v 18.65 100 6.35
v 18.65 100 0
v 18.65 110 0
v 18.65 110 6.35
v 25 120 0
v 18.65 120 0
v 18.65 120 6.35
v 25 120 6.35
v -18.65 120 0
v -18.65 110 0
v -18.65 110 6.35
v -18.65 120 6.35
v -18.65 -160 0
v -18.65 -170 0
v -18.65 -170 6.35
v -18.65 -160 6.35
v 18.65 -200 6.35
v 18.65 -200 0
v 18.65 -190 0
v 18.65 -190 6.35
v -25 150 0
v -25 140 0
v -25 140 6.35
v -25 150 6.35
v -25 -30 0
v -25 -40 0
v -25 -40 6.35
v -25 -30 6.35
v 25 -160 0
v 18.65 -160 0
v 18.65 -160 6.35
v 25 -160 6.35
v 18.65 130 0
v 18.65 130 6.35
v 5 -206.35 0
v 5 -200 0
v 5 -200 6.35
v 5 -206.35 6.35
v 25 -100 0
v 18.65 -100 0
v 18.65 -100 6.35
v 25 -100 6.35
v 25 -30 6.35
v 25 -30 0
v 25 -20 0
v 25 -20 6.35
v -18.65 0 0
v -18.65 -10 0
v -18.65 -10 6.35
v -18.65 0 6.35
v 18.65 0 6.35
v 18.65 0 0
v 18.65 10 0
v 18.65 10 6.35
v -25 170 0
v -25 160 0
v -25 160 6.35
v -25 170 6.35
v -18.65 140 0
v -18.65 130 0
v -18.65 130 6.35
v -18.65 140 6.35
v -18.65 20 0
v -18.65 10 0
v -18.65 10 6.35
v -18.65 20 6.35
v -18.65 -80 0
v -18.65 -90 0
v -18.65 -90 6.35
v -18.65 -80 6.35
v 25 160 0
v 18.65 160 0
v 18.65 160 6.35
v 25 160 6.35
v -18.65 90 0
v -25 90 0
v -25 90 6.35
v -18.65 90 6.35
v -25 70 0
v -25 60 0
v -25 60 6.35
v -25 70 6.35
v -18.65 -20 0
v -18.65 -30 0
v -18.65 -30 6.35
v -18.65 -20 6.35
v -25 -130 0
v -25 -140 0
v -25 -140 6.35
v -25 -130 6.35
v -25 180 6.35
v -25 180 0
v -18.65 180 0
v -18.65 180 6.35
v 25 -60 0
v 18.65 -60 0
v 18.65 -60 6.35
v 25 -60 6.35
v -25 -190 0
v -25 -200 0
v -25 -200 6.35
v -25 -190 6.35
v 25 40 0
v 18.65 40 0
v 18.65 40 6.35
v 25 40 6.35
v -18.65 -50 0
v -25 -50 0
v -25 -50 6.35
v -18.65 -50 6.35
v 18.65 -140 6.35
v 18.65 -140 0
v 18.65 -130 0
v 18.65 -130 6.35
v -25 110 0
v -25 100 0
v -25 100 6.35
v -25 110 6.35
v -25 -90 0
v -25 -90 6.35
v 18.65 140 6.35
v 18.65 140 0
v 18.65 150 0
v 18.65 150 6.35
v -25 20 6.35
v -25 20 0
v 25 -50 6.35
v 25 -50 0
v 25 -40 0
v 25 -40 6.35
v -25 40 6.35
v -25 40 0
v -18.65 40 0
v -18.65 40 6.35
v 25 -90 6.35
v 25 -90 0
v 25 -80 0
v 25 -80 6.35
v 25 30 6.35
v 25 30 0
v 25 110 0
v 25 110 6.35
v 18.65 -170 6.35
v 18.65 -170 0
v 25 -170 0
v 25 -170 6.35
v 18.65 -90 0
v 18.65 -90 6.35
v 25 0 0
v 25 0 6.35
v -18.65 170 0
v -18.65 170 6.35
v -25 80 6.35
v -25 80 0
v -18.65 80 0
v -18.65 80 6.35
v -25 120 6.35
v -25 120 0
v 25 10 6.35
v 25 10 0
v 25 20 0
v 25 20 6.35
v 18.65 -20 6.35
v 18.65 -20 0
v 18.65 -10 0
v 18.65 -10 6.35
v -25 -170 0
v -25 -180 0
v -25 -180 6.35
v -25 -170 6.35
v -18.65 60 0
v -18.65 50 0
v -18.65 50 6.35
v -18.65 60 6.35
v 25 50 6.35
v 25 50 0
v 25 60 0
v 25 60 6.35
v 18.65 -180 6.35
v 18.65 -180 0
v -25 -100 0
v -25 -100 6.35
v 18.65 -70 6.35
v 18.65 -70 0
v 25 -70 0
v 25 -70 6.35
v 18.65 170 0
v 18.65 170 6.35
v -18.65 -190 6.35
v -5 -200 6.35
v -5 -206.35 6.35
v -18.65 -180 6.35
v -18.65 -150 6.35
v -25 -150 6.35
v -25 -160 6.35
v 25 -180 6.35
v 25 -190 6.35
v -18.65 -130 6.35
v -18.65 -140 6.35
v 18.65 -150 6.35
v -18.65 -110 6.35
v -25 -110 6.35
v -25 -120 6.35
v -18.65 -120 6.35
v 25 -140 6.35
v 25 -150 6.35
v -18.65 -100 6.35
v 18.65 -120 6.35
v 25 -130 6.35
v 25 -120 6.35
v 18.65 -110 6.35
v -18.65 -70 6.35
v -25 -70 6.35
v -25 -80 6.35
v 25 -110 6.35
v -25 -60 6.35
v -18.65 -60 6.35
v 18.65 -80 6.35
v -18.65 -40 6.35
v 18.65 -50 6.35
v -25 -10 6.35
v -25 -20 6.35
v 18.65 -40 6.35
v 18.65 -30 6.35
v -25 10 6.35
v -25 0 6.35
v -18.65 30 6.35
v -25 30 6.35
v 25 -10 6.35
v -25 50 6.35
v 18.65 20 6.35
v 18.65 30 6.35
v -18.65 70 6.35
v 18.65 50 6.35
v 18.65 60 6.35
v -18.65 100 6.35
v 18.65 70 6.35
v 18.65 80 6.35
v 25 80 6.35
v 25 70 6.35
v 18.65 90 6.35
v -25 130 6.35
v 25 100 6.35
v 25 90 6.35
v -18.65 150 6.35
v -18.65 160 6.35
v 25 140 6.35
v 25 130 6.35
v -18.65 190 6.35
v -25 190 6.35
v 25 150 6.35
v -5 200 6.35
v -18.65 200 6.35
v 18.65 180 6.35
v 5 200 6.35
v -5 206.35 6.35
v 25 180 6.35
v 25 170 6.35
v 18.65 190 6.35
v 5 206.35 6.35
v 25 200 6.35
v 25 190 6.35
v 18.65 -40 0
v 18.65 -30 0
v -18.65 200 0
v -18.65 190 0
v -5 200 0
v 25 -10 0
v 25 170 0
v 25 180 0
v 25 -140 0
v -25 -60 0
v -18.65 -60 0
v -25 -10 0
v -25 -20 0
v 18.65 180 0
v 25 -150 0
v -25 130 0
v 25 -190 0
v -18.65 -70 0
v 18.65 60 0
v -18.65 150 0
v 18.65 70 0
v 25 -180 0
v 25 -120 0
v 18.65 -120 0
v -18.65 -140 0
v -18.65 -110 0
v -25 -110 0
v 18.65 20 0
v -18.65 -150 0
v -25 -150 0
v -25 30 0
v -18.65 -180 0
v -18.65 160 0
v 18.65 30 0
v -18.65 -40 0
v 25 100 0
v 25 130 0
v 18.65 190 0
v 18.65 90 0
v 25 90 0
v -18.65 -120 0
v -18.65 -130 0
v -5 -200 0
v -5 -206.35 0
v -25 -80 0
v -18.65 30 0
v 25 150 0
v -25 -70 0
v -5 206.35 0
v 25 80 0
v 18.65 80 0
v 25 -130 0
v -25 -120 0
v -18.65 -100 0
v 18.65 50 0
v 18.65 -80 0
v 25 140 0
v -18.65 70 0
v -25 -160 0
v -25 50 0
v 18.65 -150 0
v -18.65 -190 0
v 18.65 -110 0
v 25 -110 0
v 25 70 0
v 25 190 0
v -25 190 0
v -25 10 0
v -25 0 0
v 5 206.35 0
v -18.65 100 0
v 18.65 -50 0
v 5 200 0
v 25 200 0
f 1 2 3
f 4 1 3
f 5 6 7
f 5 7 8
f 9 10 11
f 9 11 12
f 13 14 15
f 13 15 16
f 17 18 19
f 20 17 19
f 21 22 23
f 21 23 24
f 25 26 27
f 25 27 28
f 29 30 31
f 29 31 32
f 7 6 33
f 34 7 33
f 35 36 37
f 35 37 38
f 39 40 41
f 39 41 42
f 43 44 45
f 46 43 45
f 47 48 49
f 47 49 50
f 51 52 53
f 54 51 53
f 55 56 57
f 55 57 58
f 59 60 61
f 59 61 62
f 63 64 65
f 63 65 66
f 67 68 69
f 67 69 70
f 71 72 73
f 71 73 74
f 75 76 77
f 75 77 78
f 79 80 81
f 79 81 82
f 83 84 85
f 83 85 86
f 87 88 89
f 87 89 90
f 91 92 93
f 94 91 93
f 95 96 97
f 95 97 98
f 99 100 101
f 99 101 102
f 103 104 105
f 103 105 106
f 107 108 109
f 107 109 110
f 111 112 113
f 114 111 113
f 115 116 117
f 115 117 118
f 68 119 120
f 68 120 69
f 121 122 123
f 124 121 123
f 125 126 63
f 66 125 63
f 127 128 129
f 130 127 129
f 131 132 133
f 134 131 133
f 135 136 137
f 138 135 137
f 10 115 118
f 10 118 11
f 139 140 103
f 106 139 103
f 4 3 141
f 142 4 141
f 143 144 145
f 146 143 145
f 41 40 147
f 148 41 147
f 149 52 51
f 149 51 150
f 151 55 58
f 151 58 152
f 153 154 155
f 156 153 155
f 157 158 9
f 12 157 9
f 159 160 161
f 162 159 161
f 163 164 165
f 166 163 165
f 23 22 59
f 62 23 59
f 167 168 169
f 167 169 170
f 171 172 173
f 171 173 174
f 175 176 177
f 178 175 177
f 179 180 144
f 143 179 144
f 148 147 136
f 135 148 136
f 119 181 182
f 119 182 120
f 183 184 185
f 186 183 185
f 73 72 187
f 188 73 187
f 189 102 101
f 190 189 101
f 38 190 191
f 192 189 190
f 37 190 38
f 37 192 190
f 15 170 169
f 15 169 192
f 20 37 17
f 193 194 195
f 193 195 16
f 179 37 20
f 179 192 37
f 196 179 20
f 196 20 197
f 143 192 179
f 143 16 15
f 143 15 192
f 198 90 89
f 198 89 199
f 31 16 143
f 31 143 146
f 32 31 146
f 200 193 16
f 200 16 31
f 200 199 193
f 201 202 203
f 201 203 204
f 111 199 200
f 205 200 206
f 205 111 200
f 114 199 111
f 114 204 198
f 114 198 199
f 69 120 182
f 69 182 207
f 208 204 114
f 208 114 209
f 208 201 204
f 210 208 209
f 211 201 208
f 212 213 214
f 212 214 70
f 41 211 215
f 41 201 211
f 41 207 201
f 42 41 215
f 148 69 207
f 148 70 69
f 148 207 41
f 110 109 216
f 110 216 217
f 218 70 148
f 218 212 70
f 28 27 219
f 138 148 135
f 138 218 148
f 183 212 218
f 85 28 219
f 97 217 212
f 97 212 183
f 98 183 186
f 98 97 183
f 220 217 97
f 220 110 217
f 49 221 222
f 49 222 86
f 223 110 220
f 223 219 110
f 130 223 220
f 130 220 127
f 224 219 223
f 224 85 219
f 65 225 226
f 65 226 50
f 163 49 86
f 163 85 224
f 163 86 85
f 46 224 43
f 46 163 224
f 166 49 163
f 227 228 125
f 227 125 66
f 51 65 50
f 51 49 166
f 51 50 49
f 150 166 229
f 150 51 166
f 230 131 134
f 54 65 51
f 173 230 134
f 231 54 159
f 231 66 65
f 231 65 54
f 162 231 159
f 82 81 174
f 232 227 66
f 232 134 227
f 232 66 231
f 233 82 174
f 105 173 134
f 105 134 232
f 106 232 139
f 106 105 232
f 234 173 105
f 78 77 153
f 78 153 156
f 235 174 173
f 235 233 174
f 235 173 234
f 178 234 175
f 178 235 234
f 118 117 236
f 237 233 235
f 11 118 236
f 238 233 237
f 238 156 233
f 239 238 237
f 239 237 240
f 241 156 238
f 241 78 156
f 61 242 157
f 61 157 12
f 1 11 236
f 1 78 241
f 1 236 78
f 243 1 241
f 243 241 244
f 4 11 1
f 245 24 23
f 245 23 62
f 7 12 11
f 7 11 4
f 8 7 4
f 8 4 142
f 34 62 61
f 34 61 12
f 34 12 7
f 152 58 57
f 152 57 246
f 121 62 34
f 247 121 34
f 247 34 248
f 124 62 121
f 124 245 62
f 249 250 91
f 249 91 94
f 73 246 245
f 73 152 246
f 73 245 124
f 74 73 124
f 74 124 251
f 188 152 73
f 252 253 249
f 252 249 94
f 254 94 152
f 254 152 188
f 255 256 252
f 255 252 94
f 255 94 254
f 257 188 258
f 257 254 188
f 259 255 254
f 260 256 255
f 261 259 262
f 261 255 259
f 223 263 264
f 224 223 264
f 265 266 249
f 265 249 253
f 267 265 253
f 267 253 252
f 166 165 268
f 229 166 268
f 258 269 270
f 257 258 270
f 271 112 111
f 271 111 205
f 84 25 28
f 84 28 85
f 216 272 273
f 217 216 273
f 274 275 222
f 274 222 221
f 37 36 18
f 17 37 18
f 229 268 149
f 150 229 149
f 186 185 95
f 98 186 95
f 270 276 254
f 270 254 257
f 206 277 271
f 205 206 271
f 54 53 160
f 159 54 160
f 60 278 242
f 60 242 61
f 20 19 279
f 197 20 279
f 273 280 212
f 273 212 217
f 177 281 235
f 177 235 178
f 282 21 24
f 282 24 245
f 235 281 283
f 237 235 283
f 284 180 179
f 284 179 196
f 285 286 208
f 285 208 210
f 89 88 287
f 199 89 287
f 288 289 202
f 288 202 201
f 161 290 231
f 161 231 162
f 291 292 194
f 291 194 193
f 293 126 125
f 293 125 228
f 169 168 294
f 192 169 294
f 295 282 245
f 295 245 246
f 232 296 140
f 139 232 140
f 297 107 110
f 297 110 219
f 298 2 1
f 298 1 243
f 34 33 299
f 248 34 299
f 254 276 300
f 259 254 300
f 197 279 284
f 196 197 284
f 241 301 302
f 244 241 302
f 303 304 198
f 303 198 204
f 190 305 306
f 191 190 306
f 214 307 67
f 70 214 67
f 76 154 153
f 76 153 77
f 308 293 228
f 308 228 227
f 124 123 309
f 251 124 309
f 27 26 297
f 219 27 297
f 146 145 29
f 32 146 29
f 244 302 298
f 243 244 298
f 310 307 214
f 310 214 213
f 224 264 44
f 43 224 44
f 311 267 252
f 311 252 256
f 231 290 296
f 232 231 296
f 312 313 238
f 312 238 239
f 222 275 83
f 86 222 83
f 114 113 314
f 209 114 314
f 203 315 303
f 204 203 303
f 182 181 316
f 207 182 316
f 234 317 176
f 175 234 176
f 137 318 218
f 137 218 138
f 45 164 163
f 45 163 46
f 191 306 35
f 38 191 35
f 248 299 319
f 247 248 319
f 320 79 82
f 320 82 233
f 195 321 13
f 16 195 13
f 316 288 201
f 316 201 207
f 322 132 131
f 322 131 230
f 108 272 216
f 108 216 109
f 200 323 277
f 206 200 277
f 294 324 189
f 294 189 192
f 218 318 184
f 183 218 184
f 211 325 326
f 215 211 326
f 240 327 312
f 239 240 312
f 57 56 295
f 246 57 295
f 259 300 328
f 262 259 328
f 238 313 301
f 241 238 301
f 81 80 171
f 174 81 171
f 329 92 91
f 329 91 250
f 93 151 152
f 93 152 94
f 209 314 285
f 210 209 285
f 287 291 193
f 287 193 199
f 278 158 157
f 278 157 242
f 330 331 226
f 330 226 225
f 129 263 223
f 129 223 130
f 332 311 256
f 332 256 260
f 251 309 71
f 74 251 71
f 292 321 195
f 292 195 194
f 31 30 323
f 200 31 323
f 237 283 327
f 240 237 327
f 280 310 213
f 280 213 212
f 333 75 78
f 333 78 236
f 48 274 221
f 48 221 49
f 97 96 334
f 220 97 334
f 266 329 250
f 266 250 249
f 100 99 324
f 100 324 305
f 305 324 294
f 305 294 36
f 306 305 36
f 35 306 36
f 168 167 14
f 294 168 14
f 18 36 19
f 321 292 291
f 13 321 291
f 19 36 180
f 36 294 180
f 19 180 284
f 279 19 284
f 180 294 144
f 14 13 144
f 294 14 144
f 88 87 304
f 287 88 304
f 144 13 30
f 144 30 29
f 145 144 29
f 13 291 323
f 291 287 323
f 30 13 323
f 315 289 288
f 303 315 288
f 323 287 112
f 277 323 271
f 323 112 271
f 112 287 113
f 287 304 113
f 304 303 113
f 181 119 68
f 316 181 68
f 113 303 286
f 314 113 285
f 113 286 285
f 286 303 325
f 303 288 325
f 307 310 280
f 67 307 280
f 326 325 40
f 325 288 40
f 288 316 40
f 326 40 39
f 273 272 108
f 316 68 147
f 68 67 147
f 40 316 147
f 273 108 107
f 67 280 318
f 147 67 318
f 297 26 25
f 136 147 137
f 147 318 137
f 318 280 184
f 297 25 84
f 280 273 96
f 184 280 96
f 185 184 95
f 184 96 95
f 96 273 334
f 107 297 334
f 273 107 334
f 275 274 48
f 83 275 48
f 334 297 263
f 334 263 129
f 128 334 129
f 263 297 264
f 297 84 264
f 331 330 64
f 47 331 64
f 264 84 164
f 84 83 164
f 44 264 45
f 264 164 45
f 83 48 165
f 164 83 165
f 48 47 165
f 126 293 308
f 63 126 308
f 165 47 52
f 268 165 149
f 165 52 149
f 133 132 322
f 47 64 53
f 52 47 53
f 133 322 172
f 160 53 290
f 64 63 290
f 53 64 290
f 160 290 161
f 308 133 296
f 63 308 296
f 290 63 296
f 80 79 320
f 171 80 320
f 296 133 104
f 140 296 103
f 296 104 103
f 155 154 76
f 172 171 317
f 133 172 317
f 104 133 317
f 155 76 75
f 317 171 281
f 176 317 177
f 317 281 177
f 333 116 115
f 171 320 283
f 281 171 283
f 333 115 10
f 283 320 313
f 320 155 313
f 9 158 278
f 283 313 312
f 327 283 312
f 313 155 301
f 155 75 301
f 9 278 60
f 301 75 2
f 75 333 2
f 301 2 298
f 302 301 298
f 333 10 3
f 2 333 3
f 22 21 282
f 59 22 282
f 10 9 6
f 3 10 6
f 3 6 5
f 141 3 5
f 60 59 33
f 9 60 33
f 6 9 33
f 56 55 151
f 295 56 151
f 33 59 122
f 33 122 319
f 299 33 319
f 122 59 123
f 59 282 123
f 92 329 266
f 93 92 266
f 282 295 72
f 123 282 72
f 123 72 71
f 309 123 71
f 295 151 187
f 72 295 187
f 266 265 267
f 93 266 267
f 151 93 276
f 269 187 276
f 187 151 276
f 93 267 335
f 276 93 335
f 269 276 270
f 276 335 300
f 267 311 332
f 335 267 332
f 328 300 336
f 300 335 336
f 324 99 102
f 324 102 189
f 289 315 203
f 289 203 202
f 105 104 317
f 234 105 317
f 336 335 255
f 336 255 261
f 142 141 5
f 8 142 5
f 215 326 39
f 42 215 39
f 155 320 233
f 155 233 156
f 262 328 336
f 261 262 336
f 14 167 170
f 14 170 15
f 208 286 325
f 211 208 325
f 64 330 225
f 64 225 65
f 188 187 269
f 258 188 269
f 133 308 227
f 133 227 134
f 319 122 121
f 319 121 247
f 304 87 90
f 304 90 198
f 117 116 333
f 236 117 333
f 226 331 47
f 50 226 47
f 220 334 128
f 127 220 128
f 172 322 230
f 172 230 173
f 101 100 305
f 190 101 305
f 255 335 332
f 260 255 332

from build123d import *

# Parameters (mm, degrees)
SKETCH1_W           = 37.3
SKETCH1_H           = 400
BOSS_EXTRUDE1_DEPTH = 6.35
SKETCH10_W          = 6.35
SKETCH10_H          = 10
BOSS_EXTRUDE3_DEPTH = 6.35
SKETCH11_W          = 6.35
SKETCH11_H          = 10
BOSS_EXTRUDE4_DEPTH = 6.35
LPATTERN5_COUNT     = 20
LPATTERN5_PITCH     = 20
SKETCH12_W          = 10
SKETCH12_H          = 6.35
BOSS_EXTRUDE5_DEPTH = 6.35


with BuildPart() as part:
    # Sketch1 → Boss-Extrude1 (new body)
    with BuildSketch(Plane.XY):
        Rectangle(SKETCH1_W, SKETCH1_H)
    extrude(amount=BOSS_EXTRUDE1_DEPTH)

    # Sketch10 → Boss-Extrude3 (add)
    with BuildSketch(Plane.XY):
        with Locations((-21.825, -195)):
            Rectangle(SKETCH10_W, SKETCH10_H)
    boss_extrude3 = extrude(amount=BOSS_EXTRUDE3_DEPTH)

    # Sketch11 → Boss-Extrude4 (add)
    with BuildSketch(Plane.XY):
        with Locations((21.825, -185)):
            Rectangle(SKETCH11_W, SKETCH11_H)
    boss_extrude4 = extrude(amount=BOSS_EXTRUDE4_DEPTH)

    # LPattern5: Boss-Extrude3, Boss-Extrude4 ×20
    with Locations(*[(0, i * LPATTERN5_PITCH, 0) for i in range(1, LPATTERN5_COUNT)]):
        add(boss_extrude3)
        add(boss_extrude4)

    # Sketch12 → Boss-Extrude5 (add)
    with BuildSketch(Plane.XY):
        with Locations((0, 203.175)):
            Rectangle(SKETCH12_W, SKETCH12_H)
    boss_extrude5 = extrude(amount=BOSS_EXTRUDE5_DEPTH)

    # Mirror1: Boss-Extrude5 across plane
    add(boss_extrude5.mirror(Plane.ZX))


solid = part.part
